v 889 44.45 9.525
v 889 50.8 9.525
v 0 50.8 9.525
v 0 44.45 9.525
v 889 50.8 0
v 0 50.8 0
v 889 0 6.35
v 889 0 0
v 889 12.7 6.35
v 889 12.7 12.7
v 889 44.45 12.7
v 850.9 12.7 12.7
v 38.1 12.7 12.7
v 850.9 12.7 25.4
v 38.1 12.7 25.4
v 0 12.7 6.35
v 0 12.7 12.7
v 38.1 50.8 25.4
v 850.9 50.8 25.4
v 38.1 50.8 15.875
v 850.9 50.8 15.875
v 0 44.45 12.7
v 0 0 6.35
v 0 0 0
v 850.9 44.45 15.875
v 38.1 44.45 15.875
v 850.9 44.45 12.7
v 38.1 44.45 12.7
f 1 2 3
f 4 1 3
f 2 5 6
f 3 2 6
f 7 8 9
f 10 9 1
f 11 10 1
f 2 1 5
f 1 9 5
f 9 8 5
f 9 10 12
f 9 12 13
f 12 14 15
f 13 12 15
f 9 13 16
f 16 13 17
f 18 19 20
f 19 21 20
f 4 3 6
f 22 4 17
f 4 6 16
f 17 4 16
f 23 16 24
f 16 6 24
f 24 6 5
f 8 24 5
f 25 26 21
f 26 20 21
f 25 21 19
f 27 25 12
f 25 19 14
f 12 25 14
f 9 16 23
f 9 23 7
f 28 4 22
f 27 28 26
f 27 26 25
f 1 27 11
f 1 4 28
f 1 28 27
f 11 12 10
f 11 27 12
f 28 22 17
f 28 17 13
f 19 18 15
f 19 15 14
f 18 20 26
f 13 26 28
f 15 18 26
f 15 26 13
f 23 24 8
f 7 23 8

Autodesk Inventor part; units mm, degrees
ref_plane "YZ Plane" through (0, 0, 0) normal (1, 0, 0) x (0, 1, 0)
ref_plane "XZ Plane" through (0, 0, 0) normal (0, 1, 0) x (-1, 0, 0)
ref_plane "XY Plane" through (0, 0, 0) normal (0, 0, 1) x (1, 0, 0)
sketch "Sketch1" plane through (0, 0, 0) normal (0, 0, 1) x (1, 0, 0)
  line L0 (0, 0) -> (889, 0)
  line L1 (889, 0) -> (889, 50.8)
  line L2 (889, 50.8) -> (0, 50.8)
  line L3 (0, 50.8) -> (0, 0)
  dimension "d0" = 889
  dimension "d1" = 50.8
extrude "Extrusion1" add sketch "Sketch1" along normal blind 25.4
sketch "Sketch2" plane through (0, 0, 25.4) normal (0, 0, 1) x (1, 0, 0)
  line L0 (0, 0) -> (889, 0)
  line L1 (889, 0) -> (889, 12.7)
  line L2 (889, 12.7) -> (0, 12.7)
  line L3 (0, 12.7) -> (0, 0)
  dimension "d4" = 889
  dimension "d5" = 12.7
extrude "Extrusion2" cut sketch "Sketch2" against normal blind 19.05
sketch "Sketch3" plane through (0, 0, 25.4) normal (0, 0, 1) x (1, 0, 0)
  line L0 (0, 50.8) -> (0, 0) projected
  line L1 (0, 50.8) -> (38.1, 50.8)
  line L2 (38.1, 50.8) -> (38.1, 12.7)
  line L3 (38.1, 12.7) -> (0, 12.7)
  line L4 (0, 12.7) -> (0, 50.8)
  dimension "d8" = 38.1
  dimension "d9" = 38.1
extrude "Extrusion3" cut sketch "Sketch3" against normal blind 12.7
sketch "Sketch4" plane through (0, 0, 25.4) normal (0, 0, 1) x (1, 0, 0)
  line L0 (889, 50.8) -> (850.9, 50.8)
  line L1 (850.9, 50.8) -> (850.9, 12.7)
  line L2 (850.9, 12.7) -> (889, 12.7)
  line L3 (889, 12.7) -> (889, 50.8)
  point P0 (0, 0)
  dimension "d12" = 38.1
  dimension "d13" = 38.1
extrude "Extrusion4" cut sketch "Sketch4" against normal blind 12.7
sketch "Sketch5" plane through (0, 50.8, 0) normal (0, 1, 0) x (1, 0, 0)
  line L0 (0, -6.35) -> (0, -12.7) projected
  line L1 (0, -12.7) -> (0, -15.875)
  line L2 (0, -15.875) -> (889, -15.875)
  line L3 (889, -15.875) -> (889, -9.525)
  line L4 (889, -12.7) -> (889, -6.35) projected
  line L5 (889, -9.525) -> (0, -9.525)
  line L6 (0, -9.525) -> (0, -12.7)
  dimension "d22" = 3.175
  dimension "d23" = 889
  dimension "d24" = 889
extrude "Extrusion5" cut sketch "Sketch5" against normal blind 6.35
properties part number "bottomv2" material "Wood (Cherry)"
